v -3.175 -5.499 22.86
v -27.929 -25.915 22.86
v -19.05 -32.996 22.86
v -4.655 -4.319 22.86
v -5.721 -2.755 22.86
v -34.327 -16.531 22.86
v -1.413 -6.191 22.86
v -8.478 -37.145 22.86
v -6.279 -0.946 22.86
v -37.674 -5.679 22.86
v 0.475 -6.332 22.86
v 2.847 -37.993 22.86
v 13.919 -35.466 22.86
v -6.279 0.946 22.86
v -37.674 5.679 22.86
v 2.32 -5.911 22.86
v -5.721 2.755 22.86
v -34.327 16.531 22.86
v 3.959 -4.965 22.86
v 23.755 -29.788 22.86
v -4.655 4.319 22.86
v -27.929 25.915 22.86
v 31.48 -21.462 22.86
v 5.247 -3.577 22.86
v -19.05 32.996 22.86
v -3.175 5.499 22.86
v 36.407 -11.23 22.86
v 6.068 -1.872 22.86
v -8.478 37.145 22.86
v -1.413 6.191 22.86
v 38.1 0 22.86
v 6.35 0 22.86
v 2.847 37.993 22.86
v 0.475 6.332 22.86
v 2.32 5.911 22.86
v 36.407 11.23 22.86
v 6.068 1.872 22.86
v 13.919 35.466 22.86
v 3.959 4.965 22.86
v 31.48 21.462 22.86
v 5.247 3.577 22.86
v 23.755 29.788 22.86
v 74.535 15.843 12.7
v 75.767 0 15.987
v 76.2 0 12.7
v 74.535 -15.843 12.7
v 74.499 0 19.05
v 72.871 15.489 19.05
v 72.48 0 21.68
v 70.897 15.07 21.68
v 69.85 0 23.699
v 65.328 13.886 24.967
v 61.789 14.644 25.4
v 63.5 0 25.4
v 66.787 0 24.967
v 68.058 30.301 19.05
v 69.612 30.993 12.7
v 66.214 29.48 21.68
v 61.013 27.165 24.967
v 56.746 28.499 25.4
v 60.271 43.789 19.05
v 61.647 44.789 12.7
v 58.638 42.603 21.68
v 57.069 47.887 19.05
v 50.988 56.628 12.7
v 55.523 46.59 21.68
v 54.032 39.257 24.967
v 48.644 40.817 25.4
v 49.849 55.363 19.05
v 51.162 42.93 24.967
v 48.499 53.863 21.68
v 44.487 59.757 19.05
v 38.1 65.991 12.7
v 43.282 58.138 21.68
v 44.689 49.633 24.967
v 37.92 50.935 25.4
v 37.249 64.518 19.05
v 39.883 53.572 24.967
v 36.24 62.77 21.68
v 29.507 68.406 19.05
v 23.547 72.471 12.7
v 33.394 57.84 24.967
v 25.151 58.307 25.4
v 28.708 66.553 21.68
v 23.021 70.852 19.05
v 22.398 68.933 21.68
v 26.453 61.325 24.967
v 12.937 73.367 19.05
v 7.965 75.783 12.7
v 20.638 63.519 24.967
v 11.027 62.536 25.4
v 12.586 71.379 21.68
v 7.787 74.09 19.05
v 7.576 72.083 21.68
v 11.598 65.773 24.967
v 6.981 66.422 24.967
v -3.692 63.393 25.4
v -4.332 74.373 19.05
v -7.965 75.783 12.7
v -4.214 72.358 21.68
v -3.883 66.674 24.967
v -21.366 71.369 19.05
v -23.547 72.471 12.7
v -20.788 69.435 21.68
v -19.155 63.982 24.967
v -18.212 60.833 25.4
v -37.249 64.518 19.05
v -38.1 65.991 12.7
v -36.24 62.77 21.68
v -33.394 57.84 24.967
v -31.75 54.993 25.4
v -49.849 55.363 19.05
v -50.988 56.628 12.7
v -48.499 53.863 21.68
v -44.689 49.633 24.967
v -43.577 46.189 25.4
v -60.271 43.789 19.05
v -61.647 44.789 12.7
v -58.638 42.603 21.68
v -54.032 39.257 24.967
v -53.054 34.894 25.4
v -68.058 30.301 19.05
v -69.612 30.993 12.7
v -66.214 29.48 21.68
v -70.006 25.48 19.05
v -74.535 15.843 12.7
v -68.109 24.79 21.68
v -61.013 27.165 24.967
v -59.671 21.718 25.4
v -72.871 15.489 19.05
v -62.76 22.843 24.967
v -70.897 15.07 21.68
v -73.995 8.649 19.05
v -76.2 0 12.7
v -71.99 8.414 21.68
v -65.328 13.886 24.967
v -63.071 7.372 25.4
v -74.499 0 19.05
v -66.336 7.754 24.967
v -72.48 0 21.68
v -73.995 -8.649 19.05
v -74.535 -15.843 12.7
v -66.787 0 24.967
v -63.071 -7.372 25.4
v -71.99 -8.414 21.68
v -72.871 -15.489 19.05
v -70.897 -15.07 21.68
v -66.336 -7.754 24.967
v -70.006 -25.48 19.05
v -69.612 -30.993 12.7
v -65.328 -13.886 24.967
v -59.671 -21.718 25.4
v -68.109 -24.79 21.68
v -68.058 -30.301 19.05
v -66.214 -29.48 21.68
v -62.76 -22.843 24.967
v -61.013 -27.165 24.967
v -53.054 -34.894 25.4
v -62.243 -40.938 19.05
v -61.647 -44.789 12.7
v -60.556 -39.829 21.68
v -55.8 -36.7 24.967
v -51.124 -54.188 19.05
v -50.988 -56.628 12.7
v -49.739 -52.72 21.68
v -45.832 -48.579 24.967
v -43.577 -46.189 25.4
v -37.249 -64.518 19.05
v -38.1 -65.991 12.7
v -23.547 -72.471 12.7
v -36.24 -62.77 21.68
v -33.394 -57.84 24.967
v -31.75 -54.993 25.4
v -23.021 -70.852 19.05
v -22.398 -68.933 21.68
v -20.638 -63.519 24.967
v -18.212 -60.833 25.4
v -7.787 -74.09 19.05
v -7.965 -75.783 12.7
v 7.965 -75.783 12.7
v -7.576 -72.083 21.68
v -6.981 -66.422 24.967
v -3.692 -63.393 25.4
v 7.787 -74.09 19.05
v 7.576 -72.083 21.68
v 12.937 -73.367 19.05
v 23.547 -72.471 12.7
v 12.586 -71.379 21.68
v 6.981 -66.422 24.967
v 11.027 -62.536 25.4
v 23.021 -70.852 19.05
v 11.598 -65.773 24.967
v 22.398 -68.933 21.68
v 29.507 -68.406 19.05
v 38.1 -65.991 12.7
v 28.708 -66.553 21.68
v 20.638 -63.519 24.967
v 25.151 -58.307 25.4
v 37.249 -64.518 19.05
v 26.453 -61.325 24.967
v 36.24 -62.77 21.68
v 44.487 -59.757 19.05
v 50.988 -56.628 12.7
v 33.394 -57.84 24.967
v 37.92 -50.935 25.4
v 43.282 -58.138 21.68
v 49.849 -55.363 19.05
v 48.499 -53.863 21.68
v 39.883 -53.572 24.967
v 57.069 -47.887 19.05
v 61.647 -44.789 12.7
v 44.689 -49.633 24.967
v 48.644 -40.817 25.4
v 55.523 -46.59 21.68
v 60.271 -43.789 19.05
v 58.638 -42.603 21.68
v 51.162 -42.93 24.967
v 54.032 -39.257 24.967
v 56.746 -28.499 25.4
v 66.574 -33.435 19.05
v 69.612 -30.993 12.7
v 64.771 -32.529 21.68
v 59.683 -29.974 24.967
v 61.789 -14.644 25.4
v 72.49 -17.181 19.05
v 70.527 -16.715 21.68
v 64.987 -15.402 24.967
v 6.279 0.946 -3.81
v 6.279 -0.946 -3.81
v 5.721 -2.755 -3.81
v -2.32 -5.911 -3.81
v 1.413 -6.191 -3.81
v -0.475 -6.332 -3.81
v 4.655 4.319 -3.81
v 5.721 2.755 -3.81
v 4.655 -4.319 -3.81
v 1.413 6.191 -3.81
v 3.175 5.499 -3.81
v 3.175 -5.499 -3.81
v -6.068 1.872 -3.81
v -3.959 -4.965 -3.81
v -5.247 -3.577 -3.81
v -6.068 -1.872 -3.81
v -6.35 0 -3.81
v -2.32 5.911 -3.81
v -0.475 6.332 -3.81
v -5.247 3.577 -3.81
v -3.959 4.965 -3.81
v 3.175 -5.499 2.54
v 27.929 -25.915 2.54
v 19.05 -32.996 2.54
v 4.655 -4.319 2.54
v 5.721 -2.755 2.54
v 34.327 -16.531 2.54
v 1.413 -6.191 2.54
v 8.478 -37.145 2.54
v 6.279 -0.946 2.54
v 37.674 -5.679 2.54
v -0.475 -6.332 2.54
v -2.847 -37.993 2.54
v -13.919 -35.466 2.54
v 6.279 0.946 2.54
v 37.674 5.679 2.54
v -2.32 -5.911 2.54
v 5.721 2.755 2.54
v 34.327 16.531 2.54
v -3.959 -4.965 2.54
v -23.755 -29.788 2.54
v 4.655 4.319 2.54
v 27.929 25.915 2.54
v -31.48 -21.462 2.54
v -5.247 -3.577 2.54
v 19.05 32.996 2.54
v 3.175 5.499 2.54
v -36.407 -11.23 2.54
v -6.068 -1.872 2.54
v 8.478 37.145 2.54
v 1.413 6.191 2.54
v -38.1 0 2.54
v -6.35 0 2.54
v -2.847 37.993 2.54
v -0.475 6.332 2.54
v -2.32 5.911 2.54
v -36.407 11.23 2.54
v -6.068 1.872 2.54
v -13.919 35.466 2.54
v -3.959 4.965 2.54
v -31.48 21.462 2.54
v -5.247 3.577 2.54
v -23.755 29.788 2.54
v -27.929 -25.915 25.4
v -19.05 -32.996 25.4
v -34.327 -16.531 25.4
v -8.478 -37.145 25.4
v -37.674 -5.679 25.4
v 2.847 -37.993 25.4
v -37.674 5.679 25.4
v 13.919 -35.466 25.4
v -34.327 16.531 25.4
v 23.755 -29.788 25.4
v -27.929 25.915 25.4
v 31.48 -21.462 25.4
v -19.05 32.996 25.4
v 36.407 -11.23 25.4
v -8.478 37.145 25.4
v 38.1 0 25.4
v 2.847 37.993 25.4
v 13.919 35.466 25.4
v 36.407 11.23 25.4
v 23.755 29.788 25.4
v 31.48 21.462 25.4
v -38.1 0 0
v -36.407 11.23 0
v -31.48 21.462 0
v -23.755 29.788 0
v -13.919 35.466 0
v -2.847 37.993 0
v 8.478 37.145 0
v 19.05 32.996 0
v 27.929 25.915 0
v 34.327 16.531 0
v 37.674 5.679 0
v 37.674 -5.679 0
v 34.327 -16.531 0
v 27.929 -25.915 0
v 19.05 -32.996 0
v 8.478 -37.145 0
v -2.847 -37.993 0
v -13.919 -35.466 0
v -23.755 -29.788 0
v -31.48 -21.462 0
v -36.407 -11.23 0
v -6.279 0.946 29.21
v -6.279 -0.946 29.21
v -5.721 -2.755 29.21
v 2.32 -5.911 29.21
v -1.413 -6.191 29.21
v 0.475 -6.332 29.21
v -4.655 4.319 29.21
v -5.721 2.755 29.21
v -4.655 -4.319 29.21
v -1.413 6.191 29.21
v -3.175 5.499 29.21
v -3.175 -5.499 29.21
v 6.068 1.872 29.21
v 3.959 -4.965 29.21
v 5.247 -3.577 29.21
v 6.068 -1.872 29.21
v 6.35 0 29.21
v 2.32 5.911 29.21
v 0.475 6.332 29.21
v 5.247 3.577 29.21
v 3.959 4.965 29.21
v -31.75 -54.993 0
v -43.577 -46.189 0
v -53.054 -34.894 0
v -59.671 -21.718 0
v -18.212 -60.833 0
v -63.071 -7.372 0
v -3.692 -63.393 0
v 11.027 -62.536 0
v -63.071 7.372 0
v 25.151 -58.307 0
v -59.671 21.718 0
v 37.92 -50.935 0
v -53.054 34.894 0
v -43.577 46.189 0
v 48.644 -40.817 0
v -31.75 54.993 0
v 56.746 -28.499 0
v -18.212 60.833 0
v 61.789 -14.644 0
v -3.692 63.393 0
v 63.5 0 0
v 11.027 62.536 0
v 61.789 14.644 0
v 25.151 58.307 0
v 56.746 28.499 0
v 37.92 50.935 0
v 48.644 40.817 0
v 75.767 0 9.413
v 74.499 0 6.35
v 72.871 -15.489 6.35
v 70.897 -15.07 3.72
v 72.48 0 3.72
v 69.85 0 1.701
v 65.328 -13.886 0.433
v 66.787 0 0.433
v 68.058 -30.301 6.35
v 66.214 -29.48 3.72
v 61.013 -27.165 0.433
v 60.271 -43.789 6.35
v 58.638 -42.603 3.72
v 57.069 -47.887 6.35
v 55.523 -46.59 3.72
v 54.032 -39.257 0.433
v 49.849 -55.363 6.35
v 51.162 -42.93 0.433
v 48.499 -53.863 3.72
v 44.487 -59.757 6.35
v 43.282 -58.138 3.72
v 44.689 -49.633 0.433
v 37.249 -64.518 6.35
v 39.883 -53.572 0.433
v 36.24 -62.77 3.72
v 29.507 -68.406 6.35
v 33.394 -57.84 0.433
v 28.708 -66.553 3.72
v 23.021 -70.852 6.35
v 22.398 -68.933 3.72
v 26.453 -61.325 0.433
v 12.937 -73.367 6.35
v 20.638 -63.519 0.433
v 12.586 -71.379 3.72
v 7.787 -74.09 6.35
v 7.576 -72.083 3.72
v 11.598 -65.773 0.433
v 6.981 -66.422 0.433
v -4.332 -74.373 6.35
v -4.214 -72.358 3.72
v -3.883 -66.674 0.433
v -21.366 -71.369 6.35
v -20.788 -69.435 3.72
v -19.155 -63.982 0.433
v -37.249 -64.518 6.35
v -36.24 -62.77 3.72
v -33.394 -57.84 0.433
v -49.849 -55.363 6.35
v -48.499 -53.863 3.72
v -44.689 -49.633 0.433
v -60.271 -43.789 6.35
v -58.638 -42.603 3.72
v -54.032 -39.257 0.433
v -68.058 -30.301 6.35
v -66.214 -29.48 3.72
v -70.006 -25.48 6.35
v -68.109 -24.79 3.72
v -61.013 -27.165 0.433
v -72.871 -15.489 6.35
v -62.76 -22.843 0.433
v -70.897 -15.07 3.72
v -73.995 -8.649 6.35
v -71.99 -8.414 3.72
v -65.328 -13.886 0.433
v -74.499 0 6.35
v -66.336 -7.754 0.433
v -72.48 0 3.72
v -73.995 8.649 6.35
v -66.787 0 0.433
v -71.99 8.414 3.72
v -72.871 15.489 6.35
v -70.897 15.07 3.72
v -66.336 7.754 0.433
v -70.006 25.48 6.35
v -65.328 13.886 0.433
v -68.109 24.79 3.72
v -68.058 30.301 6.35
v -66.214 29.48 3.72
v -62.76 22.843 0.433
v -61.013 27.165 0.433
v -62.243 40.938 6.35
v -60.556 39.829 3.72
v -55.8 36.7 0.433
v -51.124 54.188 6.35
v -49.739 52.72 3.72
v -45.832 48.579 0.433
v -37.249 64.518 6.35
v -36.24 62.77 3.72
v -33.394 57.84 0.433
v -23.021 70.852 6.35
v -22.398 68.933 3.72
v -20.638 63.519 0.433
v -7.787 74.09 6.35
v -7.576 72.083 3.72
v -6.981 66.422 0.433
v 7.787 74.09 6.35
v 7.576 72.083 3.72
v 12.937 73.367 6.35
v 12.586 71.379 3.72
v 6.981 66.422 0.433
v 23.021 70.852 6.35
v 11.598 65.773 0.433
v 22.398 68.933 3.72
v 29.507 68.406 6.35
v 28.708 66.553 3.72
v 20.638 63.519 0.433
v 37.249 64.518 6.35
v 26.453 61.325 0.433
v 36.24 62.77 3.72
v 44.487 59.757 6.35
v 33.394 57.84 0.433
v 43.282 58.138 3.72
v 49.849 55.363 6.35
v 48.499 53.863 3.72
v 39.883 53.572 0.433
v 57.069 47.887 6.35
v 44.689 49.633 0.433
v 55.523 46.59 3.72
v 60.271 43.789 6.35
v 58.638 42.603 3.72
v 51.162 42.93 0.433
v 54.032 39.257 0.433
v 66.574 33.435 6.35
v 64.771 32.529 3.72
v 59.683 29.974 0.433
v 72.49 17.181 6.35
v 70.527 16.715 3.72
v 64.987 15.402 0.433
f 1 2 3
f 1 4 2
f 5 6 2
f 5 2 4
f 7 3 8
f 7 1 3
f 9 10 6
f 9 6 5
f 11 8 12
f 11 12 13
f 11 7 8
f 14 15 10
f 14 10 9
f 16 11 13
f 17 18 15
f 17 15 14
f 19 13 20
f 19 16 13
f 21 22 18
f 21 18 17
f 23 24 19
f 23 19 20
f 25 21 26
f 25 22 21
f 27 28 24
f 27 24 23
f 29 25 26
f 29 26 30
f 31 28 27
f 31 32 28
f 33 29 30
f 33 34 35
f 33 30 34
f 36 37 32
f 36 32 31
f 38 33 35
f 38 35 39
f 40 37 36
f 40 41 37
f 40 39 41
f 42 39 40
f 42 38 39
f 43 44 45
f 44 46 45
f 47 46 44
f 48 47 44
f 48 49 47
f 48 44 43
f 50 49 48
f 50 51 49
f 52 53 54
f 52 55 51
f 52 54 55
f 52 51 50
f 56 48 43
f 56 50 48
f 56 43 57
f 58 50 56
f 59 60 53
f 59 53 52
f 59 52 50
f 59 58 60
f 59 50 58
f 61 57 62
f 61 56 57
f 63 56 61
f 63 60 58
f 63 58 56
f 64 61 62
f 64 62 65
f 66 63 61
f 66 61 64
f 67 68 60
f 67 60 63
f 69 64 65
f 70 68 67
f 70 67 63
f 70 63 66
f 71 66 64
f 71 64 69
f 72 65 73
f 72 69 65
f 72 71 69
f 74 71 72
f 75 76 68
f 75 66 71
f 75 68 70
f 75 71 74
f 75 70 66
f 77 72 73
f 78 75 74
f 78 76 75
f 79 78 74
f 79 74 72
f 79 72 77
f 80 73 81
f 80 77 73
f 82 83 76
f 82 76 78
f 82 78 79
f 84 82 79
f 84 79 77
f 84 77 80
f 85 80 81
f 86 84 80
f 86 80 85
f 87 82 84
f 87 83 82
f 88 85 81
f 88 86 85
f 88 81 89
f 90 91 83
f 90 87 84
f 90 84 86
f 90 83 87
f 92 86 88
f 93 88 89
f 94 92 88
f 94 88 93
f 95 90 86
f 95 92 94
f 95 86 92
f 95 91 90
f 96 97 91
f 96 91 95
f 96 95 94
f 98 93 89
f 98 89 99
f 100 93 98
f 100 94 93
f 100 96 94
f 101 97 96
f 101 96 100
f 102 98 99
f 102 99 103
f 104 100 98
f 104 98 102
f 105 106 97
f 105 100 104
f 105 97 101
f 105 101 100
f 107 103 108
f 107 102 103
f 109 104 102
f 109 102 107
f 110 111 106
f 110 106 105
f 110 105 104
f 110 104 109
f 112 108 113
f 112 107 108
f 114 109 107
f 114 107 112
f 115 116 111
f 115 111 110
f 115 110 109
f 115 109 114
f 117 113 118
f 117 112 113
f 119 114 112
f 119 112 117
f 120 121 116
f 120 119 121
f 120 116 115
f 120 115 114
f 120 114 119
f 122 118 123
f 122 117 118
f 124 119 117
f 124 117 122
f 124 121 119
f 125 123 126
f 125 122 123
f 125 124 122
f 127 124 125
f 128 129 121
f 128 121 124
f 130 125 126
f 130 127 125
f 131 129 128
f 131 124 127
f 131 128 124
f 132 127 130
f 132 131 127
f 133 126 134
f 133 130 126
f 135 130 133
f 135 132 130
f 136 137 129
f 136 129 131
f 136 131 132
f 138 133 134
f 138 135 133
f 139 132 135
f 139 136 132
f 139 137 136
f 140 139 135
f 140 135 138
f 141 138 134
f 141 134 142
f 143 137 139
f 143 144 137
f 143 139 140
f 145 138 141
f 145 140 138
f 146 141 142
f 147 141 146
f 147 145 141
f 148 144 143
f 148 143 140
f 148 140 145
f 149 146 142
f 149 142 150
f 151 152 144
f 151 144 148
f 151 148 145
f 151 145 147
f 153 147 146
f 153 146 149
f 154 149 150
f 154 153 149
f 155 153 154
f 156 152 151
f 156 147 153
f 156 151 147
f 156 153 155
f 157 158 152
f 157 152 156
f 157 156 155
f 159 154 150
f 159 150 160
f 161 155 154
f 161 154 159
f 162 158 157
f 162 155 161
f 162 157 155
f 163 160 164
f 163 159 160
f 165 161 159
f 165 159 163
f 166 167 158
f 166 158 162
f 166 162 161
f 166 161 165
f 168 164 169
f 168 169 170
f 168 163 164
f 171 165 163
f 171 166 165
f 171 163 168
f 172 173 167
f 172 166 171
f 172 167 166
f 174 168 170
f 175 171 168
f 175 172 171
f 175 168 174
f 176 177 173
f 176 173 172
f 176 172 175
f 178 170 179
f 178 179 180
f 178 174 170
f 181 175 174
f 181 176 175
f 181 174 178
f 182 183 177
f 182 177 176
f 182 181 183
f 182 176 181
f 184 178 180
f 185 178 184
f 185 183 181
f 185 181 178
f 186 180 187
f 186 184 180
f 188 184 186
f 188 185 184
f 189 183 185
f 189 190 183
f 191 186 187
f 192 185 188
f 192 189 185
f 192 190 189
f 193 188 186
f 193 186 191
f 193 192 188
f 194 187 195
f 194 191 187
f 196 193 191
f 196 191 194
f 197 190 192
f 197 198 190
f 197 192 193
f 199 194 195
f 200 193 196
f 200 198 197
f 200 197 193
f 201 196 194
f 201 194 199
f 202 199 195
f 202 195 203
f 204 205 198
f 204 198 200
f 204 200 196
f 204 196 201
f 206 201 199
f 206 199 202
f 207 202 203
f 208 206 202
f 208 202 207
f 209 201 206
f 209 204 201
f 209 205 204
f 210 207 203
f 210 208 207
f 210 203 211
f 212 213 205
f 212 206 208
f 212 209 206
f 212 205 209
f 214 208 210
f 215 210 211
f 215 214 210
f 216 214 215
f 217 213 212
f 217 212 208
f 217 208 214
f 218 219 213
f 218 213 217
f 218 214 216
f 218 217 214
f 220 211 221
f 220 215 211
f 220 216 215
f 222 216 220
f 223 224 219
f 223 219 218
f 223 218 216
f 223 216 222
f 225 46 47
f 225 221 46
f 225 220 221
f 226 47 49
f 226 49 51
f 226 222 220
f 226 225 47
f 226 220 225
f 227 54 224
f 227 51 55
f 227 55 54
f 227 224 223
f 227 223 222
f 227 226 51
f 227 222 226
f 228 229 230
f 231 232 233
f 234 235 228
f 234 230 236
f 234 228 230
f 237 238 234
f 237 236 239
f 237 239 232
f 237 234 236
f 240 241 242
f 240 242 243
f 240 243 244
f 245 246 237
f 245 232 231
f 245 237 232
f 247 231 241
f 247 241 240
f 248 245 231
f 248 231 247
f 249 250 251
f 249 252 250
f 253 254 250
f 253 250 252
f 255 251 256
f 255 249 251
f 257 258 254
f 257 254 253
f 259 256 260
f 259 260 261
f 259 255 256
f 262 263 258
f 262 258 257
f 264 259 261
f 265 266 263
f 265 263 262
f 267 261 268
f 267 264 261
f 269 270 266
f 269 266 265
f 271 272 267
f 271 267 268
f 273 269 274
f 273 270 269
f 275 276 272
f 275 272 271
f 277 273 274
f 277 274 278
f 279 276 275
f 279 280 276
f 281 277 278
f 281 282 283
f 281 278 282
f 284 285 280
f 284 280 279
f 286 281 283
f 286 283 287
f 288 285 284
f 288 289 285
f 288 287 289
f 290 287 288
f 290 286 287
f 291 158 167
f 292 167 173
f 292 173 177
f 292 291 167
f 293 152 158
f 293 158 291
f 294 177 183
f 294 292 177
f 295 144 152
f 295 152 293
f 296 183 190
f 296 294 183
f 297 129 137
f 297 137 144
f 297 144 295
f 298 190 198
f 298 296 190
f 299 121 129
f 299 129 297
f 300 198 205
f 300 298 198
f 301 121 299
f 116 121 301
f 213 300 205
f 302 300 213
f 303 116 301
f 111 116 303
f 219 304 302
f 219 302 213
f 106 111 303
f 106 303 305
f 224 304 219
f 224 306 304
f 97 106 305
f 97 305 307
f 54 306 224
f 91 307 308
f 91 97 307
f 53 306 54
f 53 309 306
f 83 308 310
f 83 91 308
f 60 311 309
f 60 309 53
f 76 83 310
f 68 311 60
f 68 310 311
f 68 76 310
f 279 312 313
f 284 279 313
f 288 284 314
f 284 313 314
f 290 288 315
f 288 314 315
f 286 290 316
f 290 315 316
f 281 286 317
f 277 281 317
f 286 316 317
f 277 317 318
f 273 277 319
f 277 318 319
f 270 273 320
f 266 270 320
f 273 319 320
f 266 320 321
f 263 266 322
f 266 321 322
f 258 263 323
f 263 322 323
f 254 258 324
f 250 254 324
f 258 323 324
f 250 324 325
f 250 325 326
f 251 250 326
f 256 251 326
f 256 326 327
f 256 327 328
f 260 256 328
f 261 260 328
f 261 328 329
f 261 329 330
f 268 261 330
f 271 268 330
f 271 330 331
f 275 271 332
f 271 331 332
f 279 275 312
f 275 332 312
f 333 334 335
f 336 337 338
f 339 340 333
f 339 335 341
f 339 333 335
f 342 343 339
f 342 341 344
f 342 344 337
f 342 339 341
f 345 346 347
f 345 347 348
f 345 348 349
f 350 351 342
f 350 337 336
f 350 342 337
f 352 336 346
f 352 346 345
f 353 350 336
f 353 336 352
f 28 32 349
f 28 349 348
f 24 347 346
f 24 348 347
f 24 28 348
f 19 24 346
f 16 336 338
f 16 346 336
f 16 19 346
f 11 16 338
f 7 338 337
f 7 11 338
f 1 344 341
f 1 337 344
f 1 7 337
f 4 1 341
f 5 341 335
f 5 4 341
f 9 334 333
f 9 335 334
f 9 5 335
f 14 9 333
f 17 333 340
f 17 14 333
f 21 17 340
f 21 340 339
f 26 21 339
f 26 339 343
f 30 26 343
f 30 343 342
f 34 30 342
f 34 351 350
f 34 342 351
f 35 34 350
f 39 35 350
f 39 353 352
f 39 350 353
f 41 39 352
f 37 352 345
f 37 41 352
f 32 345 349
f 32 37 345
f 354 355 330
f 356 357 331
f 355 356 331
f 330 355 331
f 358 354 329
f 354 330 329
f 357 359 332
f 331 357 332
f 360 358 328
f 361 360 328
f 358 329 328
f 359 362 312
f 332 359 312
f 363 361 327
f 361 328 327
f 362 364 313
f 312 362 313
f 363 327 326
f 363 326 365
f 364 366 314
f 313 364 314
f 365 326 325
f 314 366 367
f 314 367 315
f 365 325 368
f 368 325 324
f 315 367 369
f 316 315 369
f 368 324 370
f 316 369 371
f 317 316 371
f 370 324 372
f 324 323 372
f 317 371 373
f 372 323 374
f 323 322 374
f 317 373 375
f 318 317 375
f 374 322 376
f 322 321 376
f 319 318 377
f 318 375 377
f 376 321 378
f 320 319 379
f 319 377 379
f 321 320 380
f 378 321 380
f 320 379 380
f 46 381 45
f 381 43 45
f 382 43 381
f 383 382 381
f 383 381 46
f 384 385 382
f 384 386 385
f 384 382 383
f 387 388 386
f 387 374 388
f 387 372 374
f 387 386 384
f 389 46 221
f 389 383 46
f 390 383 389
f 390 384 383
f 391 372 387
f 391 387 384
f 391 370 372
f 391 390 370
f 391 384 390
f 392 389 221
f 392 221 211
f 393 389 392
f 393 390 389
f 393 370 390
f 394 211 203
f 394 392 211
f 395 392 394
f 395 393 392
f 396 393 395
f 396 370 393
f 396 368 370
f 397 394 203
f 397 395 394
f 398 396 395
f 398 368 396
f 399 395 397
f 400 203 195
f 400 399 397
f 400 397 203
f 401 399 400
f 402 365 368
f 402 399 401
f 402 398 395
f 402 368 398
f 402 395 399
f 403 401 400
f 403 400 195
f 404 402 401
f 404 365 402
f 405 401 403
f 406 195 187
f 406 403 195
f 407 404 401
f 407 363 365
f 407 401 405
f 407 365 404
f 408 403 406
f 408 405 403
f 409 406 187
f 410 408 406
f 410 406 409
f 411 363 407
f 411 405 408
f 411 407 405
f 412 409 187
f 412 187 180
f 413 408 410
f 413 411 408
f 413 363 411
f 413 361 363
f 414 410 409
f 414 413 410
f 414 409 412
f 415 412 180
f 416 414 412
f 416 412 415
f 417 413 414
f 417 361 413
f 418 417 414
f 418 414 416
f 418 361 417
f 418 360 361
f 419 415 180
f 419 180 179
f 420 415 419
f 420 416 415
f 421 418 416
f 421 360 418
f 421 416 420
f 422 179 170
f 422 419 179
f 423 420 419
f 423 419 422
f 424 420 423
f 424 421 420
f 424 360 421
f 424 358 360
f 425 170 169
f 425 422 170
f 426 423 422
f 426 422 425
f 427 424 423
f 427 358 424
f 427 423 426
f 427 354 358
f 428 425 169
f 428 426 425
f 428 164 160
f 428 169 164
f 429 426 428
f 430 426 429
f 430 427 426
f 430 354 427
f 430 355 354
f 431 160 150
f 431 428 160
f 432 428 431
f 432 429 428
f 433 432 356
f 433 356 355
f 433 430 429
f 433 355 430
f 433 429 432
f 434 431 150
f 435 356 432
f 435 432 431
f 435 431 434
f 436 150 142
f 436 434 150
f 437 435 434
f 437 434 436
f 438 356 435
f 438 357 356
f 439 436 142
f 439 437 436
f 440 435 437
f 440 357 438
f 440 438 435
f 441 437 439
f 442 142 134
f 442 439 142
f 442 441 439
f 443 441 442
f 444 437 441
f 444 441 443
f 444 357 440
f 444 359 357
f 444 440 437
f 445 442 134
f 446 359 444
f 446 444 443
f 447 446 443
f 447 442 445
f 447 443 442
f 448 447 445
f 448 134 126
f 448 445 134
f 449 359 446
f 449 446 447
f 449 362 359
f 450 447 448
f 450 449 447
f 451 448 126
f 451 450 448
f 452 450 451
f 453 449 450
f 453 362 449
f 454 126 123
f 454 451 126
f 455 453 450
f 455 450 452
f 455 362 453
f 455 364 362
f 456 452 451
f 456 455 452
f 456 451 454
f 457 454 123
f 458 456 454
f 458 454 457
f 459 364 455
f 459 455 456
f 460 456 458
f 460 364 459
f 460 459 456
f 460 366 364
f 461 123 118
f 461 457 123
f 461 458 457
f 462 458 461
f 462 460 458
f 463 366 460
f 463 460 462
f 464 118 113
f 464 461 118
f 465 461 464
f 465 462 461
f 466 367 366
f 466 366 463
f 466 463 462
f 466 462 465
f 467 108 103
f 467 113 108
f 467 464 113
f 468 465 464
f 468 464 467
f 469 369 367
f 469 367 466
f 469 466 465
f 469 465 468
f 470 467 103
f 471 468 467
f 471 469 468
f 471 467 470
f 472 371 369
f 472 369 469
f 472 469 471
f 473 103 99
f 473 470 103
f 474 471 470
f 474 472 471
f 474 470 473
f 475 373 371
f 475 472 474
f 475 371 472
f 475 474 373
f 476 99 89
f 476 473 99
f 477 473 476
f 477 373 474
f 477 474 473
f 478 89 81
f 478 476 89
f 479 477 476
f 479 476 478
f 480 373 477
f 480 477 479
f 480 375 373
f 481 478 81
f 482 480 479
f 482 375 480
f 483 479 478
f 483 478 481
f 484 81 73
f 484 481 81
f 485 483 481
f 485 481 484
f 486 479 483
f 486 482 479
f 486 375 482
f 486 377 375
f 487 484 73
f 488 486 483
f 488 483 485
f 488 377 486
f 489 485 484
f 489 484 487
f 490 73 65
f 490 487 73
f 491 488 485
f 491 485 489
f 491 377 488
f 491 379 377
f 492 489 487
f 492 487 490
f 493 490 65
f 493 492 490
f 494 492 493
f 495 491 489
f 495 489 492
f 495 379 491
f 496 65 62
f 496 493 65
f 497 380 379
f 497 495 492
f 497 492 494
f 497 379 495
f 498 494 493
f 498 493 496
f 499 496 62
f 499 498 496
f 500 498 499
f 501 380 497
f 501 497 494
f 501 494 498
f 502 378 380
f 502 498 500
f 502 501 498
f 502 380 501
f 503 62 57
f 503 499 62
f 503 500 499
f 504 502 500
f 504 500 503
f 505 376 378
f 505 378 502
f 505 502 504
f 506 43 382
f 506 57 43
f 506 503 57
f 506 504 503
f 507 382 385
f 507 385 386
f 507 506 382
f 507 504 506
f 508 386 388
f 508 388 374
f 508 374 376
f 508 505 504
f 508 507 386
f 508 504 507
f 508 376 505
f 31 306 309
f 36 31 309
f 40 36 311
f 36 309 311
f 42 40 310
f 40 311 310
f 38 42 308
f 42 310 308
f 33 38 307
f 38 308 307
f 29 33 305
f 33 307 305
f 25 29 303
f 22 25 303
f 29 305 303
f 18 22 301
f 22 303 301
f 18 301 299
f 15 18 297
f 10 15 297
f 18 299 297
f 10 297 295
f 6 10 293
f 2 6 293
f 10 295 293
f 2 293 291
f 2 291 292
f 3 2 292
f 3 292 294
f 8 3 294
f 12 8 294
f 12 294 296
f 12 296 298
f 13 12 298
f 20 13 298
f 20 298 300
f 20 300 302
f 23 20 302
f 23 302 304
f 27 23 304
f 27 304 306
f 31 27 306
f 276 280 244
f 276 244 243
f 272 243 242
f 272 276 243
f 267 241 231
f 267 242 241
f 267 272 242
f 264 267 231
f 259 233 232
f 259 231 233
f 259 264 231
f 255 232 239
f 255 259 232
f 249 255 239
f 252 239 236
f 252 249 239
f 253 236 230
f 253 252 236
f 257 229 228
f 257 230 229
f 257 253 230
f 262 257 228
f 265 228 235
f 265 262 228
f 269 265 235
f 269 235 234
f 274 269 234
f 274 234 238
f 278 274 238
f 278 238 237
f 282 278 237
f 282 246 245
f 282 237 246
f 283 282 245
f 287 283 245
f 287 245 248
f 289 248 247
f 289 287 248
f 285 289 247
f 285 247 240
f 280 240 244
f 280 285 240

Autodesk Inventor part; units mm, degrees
ref_plane "YZ Plane" through (0, 0, 0) normal (1, 0, 0) x (0, 1, 0)
ref_plane "XZ Plane" through (0, 0, 0) normal (0, 1, 0) x (-1, 0, 0)
ref_plane "XY Plane" through (0, 0, 0) normal (0, 0, 1) x (1, 0, 0)
sketch "Sketch1" plane through (0, 0, 0) normal (0, 0, 1) x (1, 0, 0)
  circle A0 centre (0, 0) radius 76.2
  dimension "d0" = 152.4
extrude "Extrusion1" add sketch "Sketch1" along normal blind 25.4
sketch "Sketch2" plane through (0, 0, 25.4) normal (0, 0, 1) x (1, 0, 0)
  circle A0 centre (0, 0) radius 76.2 projected
  circle A1 centre (0, 0) radius 38.1
  dimension "d3" = 76.2
extrude "Extrusion2" cut sketch "Sketch2" against normal blind 2.54 contours A1
sketch "Sketch3" plane through (0, 0, 0) normal (0, 0, -1) x (-1, 0, 0)
  circle A0 centre (0, 0) radius 76.2 projected
  circle A1 centre (0, 0) radius 38.1
  dimension "d6" = 76.2
extrude "Extrusion3" cut sketch "Sketch3" against normal blind 2.54 contours A1
fillet "Fillet1" radius 12.7 2 edges at (-76.2, 0, 25.4) (-76.2, 0, 0)
sketch "Sketch4" plane through (0, 0, 22.86) normal (0, 0, 1) x (1, 0, 0)
  circle A0 centre (0, 0) radius 38.1 projected
  circle A1 centre (0, 0) radius 6.35
  dimension "d10" = 12.7
extrude "Extrusion4" add sketch "Sketch4" along normal blind 6.35 contours A1
sketch "Sketch5" plane through (0, 0, 2.54) normal (0, 0, -1) x (-1, 0, 0)
  circle A0 centre (0, 0) radius 38.1 projected
  circle A1 centre (0, 0) radius 6.35
  dimension "d13" = 12.7
extrude "Extrusion5" add sketch "Sketch5" along normal blind 6.35 contours A1
properties part number "wheel"
